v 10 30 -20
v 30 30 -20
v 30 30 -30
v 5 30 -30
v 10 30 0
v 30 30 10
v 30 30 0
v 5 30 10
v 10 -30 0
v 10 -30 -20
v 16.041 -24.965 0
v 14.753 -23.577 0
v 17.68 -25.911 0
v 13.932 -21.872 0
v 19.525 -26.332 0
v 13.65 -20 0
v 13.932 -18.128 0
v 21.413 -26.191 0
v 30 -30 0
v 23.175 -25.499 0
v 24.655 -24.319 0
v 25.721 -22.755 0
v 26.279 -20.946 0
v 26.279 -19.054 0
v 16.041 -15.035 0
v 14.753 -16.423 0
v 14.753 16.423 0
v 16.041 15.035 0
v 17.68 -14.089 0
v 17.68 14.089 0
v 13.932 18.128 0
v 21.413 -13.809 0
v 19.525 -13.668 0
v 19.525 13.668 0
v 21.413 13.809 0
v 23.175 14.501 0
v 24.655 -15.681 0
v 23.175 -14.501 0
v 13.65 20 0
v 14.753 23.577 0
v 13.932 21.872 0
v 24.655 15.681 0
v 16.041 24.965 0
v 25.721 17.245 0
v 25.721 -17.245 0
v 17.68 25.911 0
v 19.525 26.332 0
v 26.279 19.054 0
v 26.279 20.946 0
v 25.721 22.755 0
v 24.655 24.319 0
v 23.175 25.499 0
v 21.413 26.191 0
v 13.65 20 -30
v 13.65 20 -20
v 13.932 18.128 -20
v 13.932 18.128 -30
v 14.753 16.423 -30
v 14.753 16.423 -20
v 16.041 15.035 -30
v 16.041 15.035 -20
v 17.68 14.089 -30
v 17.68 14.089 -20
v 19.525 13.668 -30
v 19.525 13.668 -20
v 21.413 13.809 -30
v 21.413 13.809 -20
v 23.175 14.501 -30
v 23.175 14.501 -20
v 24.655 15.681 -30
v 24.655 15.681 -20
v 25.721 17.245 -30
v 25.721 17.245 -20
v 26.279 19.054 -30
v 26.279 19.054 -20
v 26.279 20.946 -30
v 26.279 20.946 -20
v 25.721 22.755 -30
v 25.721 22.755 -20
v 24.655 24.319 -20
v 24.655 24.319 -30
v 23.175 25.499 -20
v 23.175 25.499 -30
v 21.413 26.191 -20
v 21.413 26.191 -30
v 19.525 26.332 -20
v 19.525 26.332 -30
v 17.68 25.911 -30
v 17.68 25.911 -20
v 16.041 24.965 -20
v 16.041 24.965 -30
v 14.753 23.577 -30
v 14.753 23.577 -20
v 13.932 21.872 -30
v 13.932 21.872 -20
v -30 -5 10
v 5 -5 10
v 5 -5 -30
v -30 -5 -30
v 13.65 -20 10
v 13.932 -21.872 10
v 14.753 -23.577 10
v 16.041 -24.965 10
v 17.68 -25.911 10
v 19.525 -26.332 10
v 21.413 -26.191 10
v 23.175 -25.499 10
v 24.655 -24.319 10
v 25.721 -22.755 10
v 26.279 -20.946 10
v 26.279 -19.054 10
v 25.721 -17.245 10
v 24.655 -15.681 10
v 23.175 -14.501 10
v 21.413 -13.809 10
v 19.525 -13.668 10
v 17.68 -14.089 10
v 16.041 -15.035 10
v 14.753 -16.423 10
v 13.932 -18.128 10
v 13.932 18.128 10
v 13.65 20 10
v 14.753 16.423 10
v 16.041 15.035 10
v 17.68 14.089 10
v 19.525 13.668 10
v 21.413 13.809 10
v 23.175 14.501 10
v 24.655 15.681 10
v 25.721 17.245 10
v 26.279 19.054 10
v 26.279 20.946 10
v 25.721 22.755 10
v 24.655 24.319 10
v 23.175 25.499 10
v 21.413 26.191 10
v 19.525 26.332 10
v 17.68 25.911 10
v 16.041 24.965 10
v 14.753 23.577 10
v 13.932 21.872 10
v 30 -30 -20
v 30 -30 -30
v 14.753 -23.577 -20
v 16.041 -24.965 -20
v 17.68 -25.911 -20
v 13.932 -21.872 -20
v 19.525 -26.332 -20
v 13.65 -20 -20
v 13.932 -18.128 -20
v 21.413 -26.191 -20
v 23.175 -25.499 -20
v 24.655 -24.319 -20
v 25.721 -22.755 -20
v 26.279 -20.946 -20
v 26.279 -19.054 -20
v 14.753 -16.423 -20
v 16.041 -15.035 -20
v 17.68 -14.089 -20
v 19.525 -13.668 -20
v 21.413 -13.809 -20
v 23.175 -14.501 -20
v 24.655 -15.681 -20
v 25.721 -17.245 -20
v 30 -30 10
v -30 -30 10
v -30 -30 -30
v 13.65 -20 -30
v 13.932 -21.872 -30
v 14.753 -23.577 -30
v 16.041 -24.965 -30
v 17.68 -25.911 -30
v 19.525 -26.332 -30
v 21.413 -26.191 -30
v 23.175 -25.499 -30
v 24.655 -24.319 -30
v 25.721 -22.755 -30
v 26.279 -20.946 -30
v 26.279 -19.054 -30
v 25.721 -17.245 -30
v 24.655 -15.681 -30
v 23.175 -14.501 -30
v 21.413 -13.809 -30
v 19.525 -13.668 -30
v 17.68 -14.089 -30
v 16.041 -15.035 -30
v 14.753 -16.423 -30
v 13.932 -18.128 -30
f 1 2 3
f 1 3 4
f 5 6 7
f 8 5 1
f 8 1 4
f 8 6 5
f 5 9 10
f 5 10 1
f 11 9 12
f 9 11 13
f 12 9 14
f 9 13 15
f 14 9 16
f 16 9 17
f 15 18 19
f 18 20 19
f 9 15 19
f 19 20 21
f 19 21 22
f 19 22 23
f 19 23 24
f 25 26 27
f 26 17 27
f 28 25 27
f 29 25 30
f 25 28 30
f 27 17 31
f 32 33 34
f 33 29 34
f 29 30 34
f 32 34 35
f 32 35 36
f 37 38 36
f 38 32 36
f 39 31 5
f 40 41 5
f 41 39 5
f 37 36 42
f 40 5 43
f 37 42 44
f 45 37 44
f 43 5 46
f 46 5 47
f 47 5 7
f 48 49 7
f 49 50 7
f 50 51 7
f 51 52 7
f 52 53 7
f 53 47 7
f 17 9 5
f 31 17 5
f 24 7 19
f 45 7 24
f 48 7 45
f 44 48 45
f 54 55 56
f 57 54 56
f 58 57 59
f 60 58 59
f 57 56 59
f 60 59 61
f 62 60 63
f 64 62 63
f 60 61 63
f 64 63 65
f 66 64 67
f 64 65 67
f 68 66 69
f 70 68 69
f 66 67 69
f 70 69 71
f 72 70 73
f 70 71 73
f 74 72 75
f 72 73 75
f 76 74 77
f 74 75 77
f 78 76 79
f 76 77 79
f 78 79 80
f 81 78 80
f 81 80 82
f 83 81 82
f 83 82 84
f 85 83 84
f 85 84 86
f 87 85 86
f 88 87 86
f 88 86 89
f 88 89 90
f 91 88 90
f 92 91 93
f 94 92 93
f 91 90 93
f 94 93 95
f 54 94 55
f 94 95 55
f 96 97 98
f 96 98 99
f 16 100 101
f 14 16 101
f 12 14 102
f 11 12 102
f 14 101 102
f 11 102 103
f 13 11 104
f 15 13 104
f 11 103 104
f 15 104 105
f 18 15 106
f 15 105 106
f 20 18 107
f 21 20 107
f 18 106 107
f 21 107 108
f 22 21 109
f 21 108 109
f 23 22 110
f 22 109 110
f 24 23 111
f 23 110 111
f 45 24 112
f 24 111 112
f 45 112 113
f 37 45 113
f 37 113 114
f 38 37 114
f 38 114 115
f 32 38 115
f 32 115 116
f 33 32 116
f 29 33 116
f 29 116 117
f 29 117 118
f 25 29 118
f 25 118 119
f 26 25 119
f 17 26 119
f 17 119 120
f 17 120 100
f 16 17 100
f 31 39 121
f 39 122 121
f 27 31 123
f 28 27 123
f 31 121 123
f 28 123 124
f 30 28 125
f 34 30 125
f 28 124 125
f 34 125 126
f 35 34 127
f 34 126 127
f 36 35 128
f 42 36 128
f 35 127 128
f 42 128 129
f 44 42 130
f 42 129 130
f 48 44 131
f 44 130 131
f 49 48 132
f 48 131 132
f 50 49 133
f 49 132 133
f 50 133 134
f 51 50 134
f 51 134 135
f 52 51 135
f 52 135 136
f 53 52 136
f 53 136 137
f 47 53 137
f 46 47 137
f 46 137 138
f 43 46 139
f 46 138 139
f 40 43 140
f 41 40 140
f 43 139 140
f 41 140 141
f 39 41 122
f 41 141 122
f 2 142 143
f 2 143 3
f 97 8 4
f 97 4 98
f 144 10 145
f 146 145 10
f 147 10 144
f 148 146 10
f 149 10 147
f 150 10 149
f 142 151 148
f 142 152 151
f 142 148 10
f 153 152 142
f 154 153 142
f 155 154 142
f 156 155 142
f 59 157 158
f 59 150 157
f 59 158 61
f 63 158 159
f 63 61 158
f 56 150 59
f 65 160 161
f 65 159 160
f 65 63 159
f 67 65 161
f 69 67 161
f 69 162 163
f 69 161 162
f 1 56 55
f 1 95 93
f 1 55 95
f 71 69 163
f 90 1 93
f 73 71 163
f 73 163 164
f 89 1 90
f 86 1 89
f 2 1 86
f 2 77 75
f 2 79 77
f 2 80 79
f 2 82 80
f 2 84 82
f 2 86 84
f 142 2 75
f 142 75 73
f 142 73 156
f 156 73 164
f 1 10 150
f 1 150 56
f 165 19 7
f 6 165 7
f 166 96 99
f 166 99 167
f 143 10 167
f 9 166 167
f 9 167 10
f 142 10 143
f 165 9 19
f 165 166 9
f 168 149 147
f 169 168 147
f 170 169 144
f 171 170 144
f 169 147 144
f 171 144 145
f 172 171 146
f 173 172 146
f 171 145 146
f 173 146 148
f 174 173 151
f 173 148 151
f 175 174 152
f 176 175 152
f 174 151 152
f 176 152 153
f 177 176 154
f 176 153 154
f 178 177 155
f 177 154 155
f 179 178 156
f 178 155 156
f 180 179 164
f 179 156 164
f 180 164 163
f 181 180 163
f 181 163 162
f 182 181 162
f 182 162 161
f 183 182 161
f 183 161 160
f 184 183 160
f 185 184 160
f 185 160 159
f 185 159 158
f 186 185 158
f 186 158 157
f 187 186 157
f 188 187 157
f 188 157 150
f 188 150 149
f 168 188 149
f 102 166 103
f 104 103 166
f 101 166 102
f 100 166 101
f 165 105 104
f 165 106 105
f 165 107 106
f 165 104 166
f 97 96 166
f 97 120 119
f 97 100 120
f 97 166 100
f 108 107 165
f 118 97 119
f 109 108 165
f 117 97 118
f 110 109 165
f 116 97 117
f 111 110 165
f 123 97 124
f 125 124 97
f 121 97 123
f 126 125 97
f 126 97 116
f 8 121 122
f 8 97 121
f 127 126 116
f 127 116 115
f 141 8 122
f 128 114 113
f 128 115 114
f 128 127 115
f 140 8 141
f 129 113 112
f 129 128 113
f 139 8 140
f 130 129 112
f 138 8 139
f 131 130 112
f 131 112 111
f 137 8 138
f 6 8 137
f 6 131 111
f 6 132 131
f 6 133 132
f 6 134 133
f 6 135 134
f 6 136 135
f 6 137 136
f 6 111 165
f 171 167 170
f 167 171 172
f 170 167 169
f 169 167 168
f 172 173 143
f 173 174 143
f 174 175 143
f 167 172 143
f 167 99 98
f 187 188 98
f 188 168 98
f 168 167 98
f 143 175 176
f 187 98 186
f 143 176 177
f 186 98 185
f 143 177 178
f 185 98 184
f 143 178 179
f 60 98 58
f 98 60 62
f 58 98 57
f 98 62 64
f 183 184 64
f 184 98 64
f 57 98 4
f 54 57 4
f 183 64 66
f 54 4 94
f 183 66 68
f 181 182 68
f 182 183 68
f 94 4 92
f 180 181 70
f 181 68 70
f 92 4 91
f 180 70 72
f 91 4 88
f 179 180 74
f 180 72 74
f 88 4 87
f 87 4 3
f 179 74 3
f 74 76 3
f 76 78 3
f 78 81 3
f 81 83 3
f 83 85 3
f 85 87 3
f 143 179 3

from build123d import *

# Parameters (mm, degrees)
SKETCH1_W                = 60
SKETCH1_H                = 60
BOSS_EXTRUDE1_DEPTH      = 10
SKETCH2_W                = 40
SKETCH2_H                = 35
CUT_EXTRUDE1_DEPTH       = 40
BOSS_EXTRUDE8_DEPTH      = 20
BOSS_EXTRUDE8_DEPTH_BACK = 10
BOSS_EXTRUDE9_DEPTH      = 10
SKETCH3_R                = 6.35
CUT_EXTRUDE2_DEPTH       = 40


with BuildPart() as part:
    # Sketch1 → Boss-Extrude1 (new body)
    with BuildSketch(Plane.XY):
        Rectangle(SKETCH1_W, SKETCH1_H)
    extrude(amount=BOSS_EXTRUDE1_DEPTH)

    # Sketch2 → Cut-Extrude1 (cut)
    with BuildSketch(Plane.XY.offset(10)):
        with Locations((-10, 12.5)):
            Rectangle(SKETCH2_W, SKETCH2_H)
    extrude(amount=-CUT_EXTRUDE1_DEPTH, mode=Mode.SUBTRACT)

    # Sketch6 → Boss-Extrude8 (add, two sides: drawn at the far end of the back side and taken through both)
    with BuildSketch(Plane(origin=(0, 0, 0), x_dir=(-1, 0, 0), z_dir=(0, 0, -1)).offset(-BOSS_EXTRUDE8_DEPTH_BACK)):
        Polygon((-10, 30), (-5, 30), (-5, -5), (30, -5), (30, -30), (-10, -30), align=None)
    extrude(amount=BOSS_EXTRUDE8_DEPTH + BOSS_EXTRUDE8_DEPTH_BACK)

    # Sketch7 → Boss-Extrude9 (add)
    with BuildSketch(Plane(origin=(0, 0, -20), x_dir=(-1, 0, 0), z_dir=(0, 0, -1))):
        Polygon((-30, 30), (-5, 30), (-5, -5), (30, -5), (30, -30), (-30, -30), align=None)
    extrude(amount=BOSS_EXTRUDE9_DEPTH)

    # Sketch3 → Cut-Extrude2 (cut, symmetric)
    with BuildSketch(Plane.XY.offset(10)):
        with Locations(Location((20, -20, 0), (0, 0, 180))):
            Circle(SKETCH3_R)
        with Locations(Location((20, 20, 0), (0, 0, 180))):
            Circle(SKETCH3_R)
    extrude(amount=CUT_EXTRUDE2_DEPTH, both=True, mode=Mode.SUBTRACT)


solid = part.part
